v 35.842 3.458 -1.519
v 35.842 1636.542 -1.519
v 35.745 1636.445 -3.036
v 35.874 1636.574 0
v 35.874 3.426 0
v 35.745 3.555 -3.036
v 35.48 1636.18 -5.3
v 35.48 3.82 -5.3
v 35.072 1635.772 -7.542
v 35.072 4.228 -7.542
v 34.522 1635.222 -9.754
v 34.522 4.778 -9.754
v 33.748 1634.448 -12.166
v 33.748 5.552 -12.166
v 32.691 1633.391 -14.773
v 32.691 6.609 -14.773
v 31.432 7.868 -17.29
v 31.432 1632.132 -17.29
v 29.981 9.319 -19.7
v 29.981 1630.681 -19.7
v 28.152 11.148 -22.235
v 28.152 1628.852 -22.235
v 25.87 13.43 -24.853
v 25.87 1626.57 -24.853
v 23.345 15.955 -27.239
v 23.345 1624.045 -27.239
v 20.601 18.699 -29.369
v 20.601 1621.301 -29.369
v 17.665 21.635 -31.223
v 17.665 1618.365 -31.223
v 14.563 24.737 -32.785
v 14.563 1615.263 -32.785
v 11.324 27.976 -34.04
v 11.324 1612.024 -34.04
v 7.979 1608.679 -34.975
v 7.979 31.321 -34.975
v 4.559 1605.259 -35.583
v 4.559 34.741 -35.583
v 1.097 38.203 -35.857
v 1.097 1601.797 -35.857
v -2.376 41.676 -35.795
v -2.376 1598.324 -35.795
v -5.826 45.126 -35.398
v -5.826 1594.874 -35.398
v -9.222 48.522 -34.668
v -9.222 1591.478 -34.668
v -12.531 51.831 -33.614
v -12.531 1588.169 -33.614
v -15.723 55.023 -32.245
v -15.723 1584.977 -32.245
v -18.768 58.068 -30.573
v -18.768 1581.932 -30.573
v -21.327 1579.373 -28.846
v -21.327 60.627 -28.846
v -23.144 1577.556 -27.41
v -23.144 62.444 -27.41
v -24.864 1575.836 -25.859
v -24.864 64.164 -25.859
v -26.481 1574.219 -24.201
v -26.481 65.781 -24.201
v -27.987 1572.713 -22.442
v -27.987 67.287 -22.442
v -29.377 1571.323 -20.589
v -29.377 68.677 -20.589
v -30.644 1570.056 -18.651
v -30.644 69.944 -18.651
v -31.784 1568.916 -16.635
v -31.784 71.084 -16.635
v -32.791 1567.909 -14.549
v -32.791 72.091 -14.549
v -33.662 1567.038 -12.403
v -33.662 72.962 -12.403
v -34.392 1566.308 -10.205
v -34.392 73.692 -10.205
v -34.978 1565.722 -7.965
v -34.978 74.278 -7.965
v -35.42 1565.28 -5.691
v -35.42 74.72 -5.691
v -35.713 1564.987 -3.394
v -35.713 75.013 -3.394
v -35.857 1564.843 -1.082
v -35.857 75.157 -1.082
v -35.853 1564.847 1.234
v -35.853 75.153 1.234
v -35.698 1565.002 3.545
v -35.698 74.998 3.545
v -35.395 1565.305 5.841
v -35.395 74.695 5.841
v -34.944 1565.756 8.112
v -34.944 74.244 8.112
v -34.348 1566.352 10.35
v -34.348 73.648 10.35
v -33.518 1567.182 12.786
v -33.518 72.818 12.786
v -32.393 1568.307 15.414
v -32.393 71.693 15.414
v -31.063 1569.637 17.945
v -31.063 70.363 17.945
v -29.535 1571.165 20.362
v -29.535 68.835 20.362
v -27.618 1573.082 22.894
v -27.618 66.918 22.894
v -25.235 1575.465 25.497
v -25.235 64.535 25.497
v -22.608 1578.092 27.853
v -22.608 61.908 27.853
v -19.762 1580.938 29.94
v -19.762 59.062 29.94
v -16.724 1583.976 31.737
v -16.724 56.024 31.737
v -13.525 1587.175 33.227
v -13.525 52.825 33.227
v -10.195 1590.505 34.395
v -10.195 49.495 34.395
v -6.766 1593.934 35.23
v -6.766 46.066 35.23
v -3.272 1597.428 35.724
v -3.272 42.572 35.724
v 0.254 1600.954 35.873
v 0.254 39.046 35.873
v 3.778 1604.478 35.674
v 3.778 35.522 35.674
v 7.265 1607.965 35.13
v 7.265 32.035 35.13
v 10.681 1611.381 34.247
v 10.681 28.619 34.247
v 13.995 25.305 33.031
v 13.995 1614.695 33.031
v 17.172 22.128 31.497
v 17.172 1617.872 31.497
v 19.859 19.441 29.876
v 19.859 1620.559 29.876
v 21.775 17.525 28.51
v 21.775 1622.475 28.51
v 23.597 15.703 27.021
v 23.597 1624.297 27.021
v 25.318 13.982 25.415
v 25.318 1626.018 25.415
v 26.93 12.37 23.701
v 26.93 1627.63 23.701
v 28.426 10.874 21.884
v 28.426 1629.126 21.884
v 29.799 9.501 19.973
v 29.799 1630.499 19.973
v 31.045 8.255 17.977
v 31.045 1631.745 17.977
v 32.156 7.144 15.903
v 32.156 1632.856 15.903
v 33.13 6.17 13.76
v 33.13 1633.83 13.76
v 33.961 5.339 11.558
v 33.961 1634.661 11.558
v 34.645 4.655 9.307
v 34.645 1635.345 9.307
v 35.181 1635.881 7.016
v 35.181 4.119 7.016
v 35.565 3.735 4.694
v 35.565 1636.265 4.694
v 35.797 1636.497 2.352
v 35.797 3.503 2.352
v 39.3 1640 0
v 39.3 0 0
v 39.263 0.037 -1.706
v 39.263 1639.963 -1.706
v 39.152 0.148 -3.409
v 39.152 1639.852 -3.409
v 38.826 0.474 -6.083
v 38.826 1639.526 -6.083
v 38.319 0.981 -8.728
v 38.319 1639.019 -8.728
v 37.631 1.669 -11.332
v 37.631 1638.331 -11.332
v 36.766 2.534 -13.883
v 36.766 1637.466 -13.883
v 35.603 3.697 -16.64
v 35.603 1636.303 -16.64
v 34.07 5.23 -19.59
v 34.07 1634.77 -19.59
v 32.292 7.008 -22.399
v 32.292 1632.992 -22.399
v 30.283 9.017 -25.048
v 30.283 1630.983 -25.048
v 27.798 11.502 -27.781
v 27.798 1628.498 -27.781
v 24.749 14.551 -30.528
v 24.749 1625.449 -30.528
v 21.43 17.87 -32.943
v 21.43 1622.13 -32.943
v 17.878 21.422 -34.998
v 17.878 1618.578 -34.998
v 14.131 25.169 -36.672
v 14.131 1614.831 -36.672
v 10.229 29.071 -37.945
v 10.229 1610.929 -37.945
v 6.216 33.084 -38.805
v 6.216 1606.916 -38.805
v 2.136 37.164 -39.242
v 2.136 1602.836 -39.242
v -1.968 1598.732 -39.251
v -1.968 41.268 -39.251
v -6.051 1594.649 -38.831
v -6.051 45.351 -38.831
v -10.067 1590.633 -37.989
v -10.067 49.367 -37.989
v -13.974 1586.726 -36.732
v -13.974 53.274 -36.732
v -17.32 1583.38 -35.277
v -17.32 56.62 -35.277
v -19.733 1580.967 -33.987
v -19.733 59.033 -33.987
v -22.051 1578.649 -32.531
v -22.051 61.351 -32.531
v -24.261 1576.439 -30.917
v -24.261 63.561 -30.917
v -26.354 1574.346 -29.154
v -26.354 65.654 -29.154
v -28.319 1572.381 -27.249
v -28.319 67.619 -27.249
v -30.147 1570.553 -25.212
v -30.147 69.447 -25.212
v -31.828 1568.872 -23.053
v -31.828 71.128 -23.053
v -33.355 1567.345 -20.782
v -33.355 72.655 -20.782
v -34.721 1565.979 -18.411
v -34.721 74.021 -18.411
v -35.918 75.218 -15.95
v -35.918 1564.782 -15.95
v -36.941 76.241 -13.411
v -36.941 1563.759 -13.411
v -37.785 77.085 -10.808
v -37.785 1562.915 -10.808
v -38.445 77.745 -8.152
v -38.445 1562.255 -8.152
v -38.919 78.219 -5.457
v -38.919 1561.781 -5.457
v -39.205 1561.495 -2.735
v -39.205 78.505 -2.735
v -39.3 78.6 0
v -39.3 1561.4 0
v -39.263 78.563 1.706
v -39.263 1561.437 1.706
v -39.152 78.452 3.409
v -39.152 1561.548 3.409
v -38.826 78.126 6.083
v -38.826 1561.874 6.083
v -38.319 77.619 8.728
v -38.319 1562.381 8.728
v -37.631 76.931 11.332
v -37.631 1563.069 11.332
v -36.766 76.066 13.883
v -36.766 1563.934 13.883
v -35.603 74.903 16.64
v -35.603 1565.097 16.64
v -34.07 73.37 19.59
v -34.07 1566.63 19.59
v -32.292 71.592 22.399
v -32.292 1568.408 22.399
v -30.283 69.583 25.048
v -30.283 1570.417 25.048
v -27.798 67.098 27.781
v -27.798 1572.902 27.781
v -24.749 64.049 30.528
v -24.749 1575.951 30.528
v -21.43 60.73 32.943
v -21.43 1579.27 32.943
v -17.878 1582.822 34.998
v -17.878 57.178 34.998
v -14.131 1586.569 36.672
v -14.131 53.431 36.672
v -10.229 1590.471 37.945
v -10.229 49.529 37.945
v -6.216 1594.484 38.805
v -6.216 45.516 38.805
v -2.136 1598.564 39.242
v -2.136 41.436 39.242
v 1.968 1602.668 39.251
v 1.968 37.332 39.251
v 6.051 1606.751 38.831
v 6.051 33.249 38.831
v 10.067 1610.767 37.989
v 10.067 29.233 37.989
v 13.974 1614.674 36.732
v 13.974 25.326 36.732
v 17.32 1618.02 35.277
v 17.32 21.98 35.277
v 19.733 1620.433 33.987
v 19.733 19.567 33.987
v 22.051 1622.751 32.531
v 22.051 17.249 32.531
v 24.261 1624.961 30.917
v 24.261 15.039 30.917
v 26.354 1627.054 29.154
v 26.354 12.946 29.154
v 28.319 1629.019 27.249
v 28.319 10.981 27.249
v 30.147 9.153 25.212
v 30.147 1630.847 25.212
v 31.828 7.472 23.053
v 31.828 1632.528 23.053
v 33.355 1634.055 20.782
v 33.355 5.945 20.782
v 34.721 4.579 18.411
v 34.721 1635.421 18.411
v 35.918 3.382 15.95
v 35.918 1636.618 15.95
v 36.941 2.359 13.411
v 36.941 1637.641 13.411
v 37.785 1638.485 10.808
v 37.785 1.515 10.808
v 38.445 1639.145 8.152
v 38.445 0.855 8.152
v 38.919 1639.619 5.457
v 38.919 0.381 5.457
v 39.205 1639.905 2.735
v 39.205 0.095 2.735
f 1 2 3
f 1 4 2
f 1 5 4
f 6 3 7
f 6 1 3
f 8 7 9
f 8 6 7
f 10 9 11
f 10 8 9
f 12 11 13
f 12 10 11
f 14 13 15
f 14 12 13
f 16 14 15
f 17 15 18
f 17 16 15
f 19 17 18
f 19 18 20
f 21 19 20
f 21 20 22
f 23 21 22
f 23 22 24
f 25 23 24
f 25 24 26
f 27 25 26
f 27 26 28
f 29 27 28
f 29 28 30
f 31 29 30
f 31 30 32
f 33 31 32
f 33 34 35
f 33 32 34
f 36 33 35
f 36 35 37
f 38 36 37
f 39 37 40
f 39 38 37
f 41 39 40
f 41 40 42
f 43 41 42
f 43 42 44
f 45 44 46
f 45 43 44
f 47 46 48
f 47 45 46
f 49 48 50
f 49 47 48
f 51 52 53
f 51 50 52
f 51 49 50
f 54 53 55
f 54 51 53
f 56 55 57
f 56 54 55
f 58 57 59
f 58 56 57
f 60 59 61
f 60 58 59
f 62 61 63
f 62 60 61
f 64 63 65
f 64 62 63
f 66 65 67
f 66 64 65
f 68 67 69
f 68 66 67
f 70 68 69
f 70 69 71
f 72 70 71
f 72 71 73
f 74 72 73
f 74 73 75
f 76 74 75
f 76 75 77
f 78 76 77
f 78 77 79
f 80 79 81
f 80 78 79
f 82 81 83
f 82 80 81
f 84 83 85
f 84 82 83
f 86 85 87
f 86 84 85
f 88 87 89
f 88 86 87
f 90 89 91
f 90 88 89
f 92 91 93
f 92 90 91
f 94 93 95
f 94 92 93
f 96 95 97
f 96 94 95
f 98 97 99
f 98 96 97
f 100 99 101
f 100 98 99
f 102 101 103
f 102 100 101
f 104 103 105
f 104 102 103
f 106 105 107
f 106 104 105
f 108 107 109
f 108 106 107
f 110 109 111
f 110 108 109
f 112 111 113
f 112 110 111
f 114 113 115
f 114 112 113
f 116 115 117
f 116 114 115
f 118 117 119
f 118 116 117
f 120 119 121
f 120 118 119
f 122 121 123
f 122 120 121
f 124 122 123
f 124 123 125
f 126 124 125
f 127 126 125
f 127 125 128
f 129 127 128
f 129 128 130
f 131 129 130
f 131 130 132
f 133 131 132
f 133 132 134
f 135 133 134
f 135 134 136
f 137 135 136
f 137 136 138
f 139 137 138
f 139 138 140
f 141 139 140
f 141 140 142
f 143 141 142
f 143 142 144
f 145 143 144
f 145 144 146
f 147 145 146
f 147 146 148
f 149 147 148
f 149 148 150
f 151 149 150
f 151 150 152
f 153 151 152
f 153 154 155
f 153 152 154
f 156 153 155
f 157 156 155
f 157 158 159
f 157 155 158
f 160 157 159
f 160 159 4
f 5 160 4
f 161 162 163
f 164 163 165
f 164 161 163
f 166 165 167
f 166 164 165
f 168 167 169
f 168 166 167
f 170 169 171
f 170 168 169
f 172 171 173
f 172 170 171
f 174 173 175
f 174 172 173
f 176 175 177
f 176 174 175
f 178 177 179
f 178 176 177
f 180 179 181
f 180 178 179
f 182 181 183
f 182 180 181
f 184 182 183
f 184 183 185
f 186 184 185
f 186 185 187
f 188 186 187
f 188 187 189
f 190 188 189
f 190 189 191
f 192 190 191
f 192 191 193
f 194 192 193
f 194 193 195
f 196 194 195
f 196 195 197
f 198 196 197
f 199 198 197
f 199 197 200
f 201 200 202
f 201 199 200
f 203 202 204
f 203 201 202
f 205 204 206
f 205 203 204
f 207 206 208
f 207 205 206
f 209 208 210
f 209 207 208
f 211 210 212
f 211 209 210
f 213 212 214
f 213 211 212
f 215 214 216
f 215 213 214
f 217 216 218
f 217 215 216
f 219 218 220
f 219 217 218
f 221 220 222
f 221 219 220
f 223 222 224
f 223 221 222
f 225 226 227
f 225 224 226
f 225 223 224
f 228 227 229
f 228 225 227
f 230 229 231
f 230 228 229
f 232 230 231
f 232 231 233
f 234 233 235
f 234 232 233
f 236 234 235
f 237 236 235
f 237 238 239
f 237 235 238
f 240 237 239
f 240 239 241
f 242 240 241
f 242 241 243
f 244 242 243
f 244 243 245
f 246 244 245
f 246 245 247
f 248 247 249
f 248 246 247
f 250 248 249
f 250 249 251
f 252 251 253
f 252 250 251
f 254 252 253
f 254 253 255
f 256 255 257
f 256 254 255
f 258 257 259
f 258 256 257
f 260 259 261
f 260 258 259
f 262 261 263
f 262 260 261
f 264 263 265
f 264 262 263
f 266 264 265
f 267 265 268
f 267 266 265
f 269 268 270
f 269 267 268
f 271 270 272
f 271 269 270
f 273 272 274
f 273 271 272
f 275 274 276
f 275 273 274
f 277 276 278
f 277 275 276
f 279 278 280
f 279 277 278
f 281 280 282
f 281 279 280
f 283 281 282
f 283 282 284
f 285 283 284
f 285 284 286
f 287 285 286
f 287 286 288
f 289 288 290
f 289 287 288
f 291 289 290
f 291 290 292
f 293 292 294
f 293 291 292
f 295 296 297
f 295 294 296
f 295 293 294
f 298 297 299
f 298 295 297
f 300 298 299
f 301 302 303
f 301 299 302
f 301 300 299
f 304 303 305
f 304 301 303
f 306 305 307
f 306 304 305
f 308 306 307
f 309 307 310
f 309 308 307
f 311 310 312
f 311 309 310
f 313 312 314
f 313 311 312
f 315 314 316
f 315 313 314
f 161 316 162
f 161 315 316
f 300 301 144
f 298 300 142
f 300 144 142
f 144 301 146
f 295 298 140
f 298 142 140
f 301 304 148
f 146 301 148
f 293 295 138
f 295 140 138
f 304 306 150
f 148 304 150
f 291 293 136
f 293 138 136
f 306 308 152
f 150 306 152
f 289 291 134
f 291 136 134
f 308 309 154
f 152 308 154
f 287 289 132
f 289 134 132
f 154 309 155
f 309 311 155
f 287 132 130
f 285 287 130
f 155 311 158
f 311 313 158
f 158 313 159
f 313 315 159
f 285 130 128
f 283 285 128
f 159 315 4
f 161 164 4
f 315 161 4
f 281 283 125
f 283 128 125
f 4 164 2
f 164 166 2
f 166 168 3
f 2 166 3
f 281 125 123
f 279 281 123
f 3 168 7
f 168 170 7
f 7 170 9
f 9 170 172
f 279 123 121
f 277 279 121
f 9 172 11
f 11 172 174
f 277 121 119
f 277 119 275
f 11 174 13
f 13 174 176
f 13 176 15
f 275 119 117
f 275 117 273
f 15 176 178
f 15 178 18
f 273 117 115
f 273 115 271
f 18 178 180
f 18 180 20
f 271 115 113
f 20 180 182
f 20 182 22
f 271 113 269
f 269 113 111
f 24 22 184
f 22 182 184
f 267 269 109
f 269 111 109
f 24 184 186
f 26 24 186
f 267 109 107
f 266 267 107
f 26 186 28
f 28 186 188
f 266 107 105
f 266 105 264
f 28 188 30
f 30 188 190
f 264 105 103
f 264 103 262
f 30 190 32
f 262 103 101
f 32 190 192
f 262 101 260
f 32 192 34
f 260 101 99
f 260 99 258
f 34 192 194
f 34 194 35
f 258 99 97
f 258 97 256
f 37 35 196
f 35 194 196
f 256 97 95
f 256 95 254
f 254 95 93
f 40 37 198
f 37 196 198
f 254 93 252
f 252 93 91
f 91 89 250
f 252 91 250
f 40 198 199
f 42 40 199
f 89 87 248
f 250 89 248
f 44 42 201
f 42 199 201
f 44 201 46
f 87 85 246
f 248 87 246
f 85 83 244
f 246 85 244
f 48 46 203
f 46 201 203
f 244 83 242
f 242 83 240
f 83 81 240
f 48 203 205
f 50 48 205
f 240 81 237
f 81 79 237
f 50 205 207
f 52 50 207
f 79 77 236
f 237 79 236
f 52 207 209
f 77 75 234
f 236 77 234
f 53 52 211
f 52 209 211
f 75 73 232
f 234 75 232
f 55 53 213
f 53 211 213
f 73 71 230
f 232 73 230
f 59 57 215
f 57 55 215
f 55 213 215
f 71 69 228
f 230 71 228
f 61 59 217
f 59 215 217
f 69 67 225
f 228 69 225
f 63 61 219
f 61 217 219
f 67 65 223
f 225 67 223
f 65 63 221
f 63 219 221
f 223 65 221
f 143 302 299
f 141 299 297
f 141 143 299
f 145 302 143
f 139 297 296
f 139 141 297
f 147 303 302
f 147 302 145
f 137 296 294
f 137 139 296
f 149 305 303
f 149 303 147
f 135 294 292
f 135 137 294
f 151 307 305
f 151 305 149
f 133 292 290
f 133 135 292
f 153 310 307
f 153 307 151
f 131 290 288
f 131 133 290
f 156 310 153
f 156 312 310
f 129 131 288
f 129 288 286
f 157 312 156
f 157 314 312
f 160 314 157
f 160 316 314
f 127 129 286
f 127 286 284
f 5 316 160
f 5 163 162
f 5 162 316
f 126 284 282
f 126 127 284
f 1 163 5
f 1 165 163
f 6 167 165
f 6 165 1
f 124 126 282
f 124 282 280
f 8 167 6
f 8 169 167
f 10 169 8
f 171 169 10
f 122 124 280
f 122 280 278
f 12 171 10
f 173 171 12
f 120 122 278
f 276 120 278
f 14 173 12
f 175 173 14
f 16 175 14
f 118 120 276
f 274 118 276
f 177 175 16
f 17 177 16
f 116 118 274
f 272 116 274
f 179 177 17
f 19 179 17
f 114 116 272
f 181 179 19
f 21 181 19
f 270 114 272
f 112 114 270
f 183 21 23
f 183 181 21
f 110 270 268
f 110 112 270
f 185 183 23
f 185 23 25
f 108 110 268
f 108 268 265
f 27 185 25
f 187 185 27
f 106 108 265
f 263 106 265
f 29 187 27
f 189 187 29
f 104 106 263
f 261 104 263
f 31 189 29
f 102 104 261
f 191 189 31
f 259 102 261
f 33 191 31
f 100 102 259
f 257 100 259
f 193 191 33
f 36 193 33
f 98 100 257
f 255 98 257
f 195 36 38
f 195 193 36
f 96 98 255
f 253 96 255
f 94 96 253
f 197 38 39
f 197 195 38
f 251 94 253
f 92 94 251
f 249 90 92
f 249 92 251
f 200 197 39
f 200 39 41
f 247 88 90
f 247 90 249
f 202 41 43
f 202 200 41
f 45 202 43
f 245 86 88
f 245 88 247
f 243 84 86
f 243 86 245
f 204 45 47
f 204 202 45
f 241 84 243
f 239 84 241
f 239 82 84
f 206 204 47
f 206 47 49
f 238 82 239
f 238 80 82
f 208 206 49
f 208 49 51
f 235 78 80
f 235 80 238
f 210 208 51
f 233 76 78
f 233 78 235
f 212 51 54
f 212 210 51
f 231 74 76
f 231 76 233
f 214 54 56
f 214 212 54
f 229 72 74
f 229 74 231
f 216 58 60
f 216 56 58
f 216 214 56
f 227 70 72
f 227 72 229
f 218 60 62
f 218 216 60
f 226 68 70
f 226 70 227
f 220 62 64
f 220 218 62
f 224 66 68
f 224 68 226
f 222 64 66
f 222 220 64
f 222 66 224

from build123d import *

# Parameters (mm, degrees)
ESBO_O2_W                  = 39.3
ESBO_O2_H                  = 1640
CORTE_EXTRUS_O1_DEPTH      = 1641.941491949
CORTE_EXTRUS_O1_DEPTH_BACK = 1641.941491949
ESBO_O9_R                  = 35.87378144
CORTE_EXTRUS_O6_DEPTH      = 1641.941491949


with BuildPart() as part:
    # Esboço2 → Revolução2 (revolve)
    with BuildSketch(Plane.XY):
        with Locations((19.65, 820)):
            Rectangle(ESBO_O2_W, ESBO_O2_H)
    revolve(axis=Axis((0, 0, 0), (0, 1, 0)))

    # Esboço3 → Corte-extrusão1 (cut, two sides: drawn at the far end of the back side and taken through both)
    with BuildSketch(Plane.XY.offset(-CORTE_EXTRUS_O1_DEPTH_BACK)):
        Polygon((-39.3, 1640), (39.3, 1640), (-39.3, 1561.4), align=None)
        Polygon((39.3, 0), (-39.3, 78.6), (-39.3, 0), align=None)
    extrude(amount=CORTE_EXTRUS_O1_DEPTH + CORTE_EXTRUS_O1_DEPTH_BACK, mode=Mode.SUBTRACT)

    # Esboço9 → Corte-extrusão6 (cut, through all)
    with BuildSketch(Plane(origin=(0, 0, 0), x_dir=(1, 0, 0), z_dir=(0, 1, 0))):
        Circle(ESBO_O9_R)
    extrude(amount=CORTE_EXTRUS_O6_DEPTH, mode=Mode.SUBTRACT)


solid = part.part
